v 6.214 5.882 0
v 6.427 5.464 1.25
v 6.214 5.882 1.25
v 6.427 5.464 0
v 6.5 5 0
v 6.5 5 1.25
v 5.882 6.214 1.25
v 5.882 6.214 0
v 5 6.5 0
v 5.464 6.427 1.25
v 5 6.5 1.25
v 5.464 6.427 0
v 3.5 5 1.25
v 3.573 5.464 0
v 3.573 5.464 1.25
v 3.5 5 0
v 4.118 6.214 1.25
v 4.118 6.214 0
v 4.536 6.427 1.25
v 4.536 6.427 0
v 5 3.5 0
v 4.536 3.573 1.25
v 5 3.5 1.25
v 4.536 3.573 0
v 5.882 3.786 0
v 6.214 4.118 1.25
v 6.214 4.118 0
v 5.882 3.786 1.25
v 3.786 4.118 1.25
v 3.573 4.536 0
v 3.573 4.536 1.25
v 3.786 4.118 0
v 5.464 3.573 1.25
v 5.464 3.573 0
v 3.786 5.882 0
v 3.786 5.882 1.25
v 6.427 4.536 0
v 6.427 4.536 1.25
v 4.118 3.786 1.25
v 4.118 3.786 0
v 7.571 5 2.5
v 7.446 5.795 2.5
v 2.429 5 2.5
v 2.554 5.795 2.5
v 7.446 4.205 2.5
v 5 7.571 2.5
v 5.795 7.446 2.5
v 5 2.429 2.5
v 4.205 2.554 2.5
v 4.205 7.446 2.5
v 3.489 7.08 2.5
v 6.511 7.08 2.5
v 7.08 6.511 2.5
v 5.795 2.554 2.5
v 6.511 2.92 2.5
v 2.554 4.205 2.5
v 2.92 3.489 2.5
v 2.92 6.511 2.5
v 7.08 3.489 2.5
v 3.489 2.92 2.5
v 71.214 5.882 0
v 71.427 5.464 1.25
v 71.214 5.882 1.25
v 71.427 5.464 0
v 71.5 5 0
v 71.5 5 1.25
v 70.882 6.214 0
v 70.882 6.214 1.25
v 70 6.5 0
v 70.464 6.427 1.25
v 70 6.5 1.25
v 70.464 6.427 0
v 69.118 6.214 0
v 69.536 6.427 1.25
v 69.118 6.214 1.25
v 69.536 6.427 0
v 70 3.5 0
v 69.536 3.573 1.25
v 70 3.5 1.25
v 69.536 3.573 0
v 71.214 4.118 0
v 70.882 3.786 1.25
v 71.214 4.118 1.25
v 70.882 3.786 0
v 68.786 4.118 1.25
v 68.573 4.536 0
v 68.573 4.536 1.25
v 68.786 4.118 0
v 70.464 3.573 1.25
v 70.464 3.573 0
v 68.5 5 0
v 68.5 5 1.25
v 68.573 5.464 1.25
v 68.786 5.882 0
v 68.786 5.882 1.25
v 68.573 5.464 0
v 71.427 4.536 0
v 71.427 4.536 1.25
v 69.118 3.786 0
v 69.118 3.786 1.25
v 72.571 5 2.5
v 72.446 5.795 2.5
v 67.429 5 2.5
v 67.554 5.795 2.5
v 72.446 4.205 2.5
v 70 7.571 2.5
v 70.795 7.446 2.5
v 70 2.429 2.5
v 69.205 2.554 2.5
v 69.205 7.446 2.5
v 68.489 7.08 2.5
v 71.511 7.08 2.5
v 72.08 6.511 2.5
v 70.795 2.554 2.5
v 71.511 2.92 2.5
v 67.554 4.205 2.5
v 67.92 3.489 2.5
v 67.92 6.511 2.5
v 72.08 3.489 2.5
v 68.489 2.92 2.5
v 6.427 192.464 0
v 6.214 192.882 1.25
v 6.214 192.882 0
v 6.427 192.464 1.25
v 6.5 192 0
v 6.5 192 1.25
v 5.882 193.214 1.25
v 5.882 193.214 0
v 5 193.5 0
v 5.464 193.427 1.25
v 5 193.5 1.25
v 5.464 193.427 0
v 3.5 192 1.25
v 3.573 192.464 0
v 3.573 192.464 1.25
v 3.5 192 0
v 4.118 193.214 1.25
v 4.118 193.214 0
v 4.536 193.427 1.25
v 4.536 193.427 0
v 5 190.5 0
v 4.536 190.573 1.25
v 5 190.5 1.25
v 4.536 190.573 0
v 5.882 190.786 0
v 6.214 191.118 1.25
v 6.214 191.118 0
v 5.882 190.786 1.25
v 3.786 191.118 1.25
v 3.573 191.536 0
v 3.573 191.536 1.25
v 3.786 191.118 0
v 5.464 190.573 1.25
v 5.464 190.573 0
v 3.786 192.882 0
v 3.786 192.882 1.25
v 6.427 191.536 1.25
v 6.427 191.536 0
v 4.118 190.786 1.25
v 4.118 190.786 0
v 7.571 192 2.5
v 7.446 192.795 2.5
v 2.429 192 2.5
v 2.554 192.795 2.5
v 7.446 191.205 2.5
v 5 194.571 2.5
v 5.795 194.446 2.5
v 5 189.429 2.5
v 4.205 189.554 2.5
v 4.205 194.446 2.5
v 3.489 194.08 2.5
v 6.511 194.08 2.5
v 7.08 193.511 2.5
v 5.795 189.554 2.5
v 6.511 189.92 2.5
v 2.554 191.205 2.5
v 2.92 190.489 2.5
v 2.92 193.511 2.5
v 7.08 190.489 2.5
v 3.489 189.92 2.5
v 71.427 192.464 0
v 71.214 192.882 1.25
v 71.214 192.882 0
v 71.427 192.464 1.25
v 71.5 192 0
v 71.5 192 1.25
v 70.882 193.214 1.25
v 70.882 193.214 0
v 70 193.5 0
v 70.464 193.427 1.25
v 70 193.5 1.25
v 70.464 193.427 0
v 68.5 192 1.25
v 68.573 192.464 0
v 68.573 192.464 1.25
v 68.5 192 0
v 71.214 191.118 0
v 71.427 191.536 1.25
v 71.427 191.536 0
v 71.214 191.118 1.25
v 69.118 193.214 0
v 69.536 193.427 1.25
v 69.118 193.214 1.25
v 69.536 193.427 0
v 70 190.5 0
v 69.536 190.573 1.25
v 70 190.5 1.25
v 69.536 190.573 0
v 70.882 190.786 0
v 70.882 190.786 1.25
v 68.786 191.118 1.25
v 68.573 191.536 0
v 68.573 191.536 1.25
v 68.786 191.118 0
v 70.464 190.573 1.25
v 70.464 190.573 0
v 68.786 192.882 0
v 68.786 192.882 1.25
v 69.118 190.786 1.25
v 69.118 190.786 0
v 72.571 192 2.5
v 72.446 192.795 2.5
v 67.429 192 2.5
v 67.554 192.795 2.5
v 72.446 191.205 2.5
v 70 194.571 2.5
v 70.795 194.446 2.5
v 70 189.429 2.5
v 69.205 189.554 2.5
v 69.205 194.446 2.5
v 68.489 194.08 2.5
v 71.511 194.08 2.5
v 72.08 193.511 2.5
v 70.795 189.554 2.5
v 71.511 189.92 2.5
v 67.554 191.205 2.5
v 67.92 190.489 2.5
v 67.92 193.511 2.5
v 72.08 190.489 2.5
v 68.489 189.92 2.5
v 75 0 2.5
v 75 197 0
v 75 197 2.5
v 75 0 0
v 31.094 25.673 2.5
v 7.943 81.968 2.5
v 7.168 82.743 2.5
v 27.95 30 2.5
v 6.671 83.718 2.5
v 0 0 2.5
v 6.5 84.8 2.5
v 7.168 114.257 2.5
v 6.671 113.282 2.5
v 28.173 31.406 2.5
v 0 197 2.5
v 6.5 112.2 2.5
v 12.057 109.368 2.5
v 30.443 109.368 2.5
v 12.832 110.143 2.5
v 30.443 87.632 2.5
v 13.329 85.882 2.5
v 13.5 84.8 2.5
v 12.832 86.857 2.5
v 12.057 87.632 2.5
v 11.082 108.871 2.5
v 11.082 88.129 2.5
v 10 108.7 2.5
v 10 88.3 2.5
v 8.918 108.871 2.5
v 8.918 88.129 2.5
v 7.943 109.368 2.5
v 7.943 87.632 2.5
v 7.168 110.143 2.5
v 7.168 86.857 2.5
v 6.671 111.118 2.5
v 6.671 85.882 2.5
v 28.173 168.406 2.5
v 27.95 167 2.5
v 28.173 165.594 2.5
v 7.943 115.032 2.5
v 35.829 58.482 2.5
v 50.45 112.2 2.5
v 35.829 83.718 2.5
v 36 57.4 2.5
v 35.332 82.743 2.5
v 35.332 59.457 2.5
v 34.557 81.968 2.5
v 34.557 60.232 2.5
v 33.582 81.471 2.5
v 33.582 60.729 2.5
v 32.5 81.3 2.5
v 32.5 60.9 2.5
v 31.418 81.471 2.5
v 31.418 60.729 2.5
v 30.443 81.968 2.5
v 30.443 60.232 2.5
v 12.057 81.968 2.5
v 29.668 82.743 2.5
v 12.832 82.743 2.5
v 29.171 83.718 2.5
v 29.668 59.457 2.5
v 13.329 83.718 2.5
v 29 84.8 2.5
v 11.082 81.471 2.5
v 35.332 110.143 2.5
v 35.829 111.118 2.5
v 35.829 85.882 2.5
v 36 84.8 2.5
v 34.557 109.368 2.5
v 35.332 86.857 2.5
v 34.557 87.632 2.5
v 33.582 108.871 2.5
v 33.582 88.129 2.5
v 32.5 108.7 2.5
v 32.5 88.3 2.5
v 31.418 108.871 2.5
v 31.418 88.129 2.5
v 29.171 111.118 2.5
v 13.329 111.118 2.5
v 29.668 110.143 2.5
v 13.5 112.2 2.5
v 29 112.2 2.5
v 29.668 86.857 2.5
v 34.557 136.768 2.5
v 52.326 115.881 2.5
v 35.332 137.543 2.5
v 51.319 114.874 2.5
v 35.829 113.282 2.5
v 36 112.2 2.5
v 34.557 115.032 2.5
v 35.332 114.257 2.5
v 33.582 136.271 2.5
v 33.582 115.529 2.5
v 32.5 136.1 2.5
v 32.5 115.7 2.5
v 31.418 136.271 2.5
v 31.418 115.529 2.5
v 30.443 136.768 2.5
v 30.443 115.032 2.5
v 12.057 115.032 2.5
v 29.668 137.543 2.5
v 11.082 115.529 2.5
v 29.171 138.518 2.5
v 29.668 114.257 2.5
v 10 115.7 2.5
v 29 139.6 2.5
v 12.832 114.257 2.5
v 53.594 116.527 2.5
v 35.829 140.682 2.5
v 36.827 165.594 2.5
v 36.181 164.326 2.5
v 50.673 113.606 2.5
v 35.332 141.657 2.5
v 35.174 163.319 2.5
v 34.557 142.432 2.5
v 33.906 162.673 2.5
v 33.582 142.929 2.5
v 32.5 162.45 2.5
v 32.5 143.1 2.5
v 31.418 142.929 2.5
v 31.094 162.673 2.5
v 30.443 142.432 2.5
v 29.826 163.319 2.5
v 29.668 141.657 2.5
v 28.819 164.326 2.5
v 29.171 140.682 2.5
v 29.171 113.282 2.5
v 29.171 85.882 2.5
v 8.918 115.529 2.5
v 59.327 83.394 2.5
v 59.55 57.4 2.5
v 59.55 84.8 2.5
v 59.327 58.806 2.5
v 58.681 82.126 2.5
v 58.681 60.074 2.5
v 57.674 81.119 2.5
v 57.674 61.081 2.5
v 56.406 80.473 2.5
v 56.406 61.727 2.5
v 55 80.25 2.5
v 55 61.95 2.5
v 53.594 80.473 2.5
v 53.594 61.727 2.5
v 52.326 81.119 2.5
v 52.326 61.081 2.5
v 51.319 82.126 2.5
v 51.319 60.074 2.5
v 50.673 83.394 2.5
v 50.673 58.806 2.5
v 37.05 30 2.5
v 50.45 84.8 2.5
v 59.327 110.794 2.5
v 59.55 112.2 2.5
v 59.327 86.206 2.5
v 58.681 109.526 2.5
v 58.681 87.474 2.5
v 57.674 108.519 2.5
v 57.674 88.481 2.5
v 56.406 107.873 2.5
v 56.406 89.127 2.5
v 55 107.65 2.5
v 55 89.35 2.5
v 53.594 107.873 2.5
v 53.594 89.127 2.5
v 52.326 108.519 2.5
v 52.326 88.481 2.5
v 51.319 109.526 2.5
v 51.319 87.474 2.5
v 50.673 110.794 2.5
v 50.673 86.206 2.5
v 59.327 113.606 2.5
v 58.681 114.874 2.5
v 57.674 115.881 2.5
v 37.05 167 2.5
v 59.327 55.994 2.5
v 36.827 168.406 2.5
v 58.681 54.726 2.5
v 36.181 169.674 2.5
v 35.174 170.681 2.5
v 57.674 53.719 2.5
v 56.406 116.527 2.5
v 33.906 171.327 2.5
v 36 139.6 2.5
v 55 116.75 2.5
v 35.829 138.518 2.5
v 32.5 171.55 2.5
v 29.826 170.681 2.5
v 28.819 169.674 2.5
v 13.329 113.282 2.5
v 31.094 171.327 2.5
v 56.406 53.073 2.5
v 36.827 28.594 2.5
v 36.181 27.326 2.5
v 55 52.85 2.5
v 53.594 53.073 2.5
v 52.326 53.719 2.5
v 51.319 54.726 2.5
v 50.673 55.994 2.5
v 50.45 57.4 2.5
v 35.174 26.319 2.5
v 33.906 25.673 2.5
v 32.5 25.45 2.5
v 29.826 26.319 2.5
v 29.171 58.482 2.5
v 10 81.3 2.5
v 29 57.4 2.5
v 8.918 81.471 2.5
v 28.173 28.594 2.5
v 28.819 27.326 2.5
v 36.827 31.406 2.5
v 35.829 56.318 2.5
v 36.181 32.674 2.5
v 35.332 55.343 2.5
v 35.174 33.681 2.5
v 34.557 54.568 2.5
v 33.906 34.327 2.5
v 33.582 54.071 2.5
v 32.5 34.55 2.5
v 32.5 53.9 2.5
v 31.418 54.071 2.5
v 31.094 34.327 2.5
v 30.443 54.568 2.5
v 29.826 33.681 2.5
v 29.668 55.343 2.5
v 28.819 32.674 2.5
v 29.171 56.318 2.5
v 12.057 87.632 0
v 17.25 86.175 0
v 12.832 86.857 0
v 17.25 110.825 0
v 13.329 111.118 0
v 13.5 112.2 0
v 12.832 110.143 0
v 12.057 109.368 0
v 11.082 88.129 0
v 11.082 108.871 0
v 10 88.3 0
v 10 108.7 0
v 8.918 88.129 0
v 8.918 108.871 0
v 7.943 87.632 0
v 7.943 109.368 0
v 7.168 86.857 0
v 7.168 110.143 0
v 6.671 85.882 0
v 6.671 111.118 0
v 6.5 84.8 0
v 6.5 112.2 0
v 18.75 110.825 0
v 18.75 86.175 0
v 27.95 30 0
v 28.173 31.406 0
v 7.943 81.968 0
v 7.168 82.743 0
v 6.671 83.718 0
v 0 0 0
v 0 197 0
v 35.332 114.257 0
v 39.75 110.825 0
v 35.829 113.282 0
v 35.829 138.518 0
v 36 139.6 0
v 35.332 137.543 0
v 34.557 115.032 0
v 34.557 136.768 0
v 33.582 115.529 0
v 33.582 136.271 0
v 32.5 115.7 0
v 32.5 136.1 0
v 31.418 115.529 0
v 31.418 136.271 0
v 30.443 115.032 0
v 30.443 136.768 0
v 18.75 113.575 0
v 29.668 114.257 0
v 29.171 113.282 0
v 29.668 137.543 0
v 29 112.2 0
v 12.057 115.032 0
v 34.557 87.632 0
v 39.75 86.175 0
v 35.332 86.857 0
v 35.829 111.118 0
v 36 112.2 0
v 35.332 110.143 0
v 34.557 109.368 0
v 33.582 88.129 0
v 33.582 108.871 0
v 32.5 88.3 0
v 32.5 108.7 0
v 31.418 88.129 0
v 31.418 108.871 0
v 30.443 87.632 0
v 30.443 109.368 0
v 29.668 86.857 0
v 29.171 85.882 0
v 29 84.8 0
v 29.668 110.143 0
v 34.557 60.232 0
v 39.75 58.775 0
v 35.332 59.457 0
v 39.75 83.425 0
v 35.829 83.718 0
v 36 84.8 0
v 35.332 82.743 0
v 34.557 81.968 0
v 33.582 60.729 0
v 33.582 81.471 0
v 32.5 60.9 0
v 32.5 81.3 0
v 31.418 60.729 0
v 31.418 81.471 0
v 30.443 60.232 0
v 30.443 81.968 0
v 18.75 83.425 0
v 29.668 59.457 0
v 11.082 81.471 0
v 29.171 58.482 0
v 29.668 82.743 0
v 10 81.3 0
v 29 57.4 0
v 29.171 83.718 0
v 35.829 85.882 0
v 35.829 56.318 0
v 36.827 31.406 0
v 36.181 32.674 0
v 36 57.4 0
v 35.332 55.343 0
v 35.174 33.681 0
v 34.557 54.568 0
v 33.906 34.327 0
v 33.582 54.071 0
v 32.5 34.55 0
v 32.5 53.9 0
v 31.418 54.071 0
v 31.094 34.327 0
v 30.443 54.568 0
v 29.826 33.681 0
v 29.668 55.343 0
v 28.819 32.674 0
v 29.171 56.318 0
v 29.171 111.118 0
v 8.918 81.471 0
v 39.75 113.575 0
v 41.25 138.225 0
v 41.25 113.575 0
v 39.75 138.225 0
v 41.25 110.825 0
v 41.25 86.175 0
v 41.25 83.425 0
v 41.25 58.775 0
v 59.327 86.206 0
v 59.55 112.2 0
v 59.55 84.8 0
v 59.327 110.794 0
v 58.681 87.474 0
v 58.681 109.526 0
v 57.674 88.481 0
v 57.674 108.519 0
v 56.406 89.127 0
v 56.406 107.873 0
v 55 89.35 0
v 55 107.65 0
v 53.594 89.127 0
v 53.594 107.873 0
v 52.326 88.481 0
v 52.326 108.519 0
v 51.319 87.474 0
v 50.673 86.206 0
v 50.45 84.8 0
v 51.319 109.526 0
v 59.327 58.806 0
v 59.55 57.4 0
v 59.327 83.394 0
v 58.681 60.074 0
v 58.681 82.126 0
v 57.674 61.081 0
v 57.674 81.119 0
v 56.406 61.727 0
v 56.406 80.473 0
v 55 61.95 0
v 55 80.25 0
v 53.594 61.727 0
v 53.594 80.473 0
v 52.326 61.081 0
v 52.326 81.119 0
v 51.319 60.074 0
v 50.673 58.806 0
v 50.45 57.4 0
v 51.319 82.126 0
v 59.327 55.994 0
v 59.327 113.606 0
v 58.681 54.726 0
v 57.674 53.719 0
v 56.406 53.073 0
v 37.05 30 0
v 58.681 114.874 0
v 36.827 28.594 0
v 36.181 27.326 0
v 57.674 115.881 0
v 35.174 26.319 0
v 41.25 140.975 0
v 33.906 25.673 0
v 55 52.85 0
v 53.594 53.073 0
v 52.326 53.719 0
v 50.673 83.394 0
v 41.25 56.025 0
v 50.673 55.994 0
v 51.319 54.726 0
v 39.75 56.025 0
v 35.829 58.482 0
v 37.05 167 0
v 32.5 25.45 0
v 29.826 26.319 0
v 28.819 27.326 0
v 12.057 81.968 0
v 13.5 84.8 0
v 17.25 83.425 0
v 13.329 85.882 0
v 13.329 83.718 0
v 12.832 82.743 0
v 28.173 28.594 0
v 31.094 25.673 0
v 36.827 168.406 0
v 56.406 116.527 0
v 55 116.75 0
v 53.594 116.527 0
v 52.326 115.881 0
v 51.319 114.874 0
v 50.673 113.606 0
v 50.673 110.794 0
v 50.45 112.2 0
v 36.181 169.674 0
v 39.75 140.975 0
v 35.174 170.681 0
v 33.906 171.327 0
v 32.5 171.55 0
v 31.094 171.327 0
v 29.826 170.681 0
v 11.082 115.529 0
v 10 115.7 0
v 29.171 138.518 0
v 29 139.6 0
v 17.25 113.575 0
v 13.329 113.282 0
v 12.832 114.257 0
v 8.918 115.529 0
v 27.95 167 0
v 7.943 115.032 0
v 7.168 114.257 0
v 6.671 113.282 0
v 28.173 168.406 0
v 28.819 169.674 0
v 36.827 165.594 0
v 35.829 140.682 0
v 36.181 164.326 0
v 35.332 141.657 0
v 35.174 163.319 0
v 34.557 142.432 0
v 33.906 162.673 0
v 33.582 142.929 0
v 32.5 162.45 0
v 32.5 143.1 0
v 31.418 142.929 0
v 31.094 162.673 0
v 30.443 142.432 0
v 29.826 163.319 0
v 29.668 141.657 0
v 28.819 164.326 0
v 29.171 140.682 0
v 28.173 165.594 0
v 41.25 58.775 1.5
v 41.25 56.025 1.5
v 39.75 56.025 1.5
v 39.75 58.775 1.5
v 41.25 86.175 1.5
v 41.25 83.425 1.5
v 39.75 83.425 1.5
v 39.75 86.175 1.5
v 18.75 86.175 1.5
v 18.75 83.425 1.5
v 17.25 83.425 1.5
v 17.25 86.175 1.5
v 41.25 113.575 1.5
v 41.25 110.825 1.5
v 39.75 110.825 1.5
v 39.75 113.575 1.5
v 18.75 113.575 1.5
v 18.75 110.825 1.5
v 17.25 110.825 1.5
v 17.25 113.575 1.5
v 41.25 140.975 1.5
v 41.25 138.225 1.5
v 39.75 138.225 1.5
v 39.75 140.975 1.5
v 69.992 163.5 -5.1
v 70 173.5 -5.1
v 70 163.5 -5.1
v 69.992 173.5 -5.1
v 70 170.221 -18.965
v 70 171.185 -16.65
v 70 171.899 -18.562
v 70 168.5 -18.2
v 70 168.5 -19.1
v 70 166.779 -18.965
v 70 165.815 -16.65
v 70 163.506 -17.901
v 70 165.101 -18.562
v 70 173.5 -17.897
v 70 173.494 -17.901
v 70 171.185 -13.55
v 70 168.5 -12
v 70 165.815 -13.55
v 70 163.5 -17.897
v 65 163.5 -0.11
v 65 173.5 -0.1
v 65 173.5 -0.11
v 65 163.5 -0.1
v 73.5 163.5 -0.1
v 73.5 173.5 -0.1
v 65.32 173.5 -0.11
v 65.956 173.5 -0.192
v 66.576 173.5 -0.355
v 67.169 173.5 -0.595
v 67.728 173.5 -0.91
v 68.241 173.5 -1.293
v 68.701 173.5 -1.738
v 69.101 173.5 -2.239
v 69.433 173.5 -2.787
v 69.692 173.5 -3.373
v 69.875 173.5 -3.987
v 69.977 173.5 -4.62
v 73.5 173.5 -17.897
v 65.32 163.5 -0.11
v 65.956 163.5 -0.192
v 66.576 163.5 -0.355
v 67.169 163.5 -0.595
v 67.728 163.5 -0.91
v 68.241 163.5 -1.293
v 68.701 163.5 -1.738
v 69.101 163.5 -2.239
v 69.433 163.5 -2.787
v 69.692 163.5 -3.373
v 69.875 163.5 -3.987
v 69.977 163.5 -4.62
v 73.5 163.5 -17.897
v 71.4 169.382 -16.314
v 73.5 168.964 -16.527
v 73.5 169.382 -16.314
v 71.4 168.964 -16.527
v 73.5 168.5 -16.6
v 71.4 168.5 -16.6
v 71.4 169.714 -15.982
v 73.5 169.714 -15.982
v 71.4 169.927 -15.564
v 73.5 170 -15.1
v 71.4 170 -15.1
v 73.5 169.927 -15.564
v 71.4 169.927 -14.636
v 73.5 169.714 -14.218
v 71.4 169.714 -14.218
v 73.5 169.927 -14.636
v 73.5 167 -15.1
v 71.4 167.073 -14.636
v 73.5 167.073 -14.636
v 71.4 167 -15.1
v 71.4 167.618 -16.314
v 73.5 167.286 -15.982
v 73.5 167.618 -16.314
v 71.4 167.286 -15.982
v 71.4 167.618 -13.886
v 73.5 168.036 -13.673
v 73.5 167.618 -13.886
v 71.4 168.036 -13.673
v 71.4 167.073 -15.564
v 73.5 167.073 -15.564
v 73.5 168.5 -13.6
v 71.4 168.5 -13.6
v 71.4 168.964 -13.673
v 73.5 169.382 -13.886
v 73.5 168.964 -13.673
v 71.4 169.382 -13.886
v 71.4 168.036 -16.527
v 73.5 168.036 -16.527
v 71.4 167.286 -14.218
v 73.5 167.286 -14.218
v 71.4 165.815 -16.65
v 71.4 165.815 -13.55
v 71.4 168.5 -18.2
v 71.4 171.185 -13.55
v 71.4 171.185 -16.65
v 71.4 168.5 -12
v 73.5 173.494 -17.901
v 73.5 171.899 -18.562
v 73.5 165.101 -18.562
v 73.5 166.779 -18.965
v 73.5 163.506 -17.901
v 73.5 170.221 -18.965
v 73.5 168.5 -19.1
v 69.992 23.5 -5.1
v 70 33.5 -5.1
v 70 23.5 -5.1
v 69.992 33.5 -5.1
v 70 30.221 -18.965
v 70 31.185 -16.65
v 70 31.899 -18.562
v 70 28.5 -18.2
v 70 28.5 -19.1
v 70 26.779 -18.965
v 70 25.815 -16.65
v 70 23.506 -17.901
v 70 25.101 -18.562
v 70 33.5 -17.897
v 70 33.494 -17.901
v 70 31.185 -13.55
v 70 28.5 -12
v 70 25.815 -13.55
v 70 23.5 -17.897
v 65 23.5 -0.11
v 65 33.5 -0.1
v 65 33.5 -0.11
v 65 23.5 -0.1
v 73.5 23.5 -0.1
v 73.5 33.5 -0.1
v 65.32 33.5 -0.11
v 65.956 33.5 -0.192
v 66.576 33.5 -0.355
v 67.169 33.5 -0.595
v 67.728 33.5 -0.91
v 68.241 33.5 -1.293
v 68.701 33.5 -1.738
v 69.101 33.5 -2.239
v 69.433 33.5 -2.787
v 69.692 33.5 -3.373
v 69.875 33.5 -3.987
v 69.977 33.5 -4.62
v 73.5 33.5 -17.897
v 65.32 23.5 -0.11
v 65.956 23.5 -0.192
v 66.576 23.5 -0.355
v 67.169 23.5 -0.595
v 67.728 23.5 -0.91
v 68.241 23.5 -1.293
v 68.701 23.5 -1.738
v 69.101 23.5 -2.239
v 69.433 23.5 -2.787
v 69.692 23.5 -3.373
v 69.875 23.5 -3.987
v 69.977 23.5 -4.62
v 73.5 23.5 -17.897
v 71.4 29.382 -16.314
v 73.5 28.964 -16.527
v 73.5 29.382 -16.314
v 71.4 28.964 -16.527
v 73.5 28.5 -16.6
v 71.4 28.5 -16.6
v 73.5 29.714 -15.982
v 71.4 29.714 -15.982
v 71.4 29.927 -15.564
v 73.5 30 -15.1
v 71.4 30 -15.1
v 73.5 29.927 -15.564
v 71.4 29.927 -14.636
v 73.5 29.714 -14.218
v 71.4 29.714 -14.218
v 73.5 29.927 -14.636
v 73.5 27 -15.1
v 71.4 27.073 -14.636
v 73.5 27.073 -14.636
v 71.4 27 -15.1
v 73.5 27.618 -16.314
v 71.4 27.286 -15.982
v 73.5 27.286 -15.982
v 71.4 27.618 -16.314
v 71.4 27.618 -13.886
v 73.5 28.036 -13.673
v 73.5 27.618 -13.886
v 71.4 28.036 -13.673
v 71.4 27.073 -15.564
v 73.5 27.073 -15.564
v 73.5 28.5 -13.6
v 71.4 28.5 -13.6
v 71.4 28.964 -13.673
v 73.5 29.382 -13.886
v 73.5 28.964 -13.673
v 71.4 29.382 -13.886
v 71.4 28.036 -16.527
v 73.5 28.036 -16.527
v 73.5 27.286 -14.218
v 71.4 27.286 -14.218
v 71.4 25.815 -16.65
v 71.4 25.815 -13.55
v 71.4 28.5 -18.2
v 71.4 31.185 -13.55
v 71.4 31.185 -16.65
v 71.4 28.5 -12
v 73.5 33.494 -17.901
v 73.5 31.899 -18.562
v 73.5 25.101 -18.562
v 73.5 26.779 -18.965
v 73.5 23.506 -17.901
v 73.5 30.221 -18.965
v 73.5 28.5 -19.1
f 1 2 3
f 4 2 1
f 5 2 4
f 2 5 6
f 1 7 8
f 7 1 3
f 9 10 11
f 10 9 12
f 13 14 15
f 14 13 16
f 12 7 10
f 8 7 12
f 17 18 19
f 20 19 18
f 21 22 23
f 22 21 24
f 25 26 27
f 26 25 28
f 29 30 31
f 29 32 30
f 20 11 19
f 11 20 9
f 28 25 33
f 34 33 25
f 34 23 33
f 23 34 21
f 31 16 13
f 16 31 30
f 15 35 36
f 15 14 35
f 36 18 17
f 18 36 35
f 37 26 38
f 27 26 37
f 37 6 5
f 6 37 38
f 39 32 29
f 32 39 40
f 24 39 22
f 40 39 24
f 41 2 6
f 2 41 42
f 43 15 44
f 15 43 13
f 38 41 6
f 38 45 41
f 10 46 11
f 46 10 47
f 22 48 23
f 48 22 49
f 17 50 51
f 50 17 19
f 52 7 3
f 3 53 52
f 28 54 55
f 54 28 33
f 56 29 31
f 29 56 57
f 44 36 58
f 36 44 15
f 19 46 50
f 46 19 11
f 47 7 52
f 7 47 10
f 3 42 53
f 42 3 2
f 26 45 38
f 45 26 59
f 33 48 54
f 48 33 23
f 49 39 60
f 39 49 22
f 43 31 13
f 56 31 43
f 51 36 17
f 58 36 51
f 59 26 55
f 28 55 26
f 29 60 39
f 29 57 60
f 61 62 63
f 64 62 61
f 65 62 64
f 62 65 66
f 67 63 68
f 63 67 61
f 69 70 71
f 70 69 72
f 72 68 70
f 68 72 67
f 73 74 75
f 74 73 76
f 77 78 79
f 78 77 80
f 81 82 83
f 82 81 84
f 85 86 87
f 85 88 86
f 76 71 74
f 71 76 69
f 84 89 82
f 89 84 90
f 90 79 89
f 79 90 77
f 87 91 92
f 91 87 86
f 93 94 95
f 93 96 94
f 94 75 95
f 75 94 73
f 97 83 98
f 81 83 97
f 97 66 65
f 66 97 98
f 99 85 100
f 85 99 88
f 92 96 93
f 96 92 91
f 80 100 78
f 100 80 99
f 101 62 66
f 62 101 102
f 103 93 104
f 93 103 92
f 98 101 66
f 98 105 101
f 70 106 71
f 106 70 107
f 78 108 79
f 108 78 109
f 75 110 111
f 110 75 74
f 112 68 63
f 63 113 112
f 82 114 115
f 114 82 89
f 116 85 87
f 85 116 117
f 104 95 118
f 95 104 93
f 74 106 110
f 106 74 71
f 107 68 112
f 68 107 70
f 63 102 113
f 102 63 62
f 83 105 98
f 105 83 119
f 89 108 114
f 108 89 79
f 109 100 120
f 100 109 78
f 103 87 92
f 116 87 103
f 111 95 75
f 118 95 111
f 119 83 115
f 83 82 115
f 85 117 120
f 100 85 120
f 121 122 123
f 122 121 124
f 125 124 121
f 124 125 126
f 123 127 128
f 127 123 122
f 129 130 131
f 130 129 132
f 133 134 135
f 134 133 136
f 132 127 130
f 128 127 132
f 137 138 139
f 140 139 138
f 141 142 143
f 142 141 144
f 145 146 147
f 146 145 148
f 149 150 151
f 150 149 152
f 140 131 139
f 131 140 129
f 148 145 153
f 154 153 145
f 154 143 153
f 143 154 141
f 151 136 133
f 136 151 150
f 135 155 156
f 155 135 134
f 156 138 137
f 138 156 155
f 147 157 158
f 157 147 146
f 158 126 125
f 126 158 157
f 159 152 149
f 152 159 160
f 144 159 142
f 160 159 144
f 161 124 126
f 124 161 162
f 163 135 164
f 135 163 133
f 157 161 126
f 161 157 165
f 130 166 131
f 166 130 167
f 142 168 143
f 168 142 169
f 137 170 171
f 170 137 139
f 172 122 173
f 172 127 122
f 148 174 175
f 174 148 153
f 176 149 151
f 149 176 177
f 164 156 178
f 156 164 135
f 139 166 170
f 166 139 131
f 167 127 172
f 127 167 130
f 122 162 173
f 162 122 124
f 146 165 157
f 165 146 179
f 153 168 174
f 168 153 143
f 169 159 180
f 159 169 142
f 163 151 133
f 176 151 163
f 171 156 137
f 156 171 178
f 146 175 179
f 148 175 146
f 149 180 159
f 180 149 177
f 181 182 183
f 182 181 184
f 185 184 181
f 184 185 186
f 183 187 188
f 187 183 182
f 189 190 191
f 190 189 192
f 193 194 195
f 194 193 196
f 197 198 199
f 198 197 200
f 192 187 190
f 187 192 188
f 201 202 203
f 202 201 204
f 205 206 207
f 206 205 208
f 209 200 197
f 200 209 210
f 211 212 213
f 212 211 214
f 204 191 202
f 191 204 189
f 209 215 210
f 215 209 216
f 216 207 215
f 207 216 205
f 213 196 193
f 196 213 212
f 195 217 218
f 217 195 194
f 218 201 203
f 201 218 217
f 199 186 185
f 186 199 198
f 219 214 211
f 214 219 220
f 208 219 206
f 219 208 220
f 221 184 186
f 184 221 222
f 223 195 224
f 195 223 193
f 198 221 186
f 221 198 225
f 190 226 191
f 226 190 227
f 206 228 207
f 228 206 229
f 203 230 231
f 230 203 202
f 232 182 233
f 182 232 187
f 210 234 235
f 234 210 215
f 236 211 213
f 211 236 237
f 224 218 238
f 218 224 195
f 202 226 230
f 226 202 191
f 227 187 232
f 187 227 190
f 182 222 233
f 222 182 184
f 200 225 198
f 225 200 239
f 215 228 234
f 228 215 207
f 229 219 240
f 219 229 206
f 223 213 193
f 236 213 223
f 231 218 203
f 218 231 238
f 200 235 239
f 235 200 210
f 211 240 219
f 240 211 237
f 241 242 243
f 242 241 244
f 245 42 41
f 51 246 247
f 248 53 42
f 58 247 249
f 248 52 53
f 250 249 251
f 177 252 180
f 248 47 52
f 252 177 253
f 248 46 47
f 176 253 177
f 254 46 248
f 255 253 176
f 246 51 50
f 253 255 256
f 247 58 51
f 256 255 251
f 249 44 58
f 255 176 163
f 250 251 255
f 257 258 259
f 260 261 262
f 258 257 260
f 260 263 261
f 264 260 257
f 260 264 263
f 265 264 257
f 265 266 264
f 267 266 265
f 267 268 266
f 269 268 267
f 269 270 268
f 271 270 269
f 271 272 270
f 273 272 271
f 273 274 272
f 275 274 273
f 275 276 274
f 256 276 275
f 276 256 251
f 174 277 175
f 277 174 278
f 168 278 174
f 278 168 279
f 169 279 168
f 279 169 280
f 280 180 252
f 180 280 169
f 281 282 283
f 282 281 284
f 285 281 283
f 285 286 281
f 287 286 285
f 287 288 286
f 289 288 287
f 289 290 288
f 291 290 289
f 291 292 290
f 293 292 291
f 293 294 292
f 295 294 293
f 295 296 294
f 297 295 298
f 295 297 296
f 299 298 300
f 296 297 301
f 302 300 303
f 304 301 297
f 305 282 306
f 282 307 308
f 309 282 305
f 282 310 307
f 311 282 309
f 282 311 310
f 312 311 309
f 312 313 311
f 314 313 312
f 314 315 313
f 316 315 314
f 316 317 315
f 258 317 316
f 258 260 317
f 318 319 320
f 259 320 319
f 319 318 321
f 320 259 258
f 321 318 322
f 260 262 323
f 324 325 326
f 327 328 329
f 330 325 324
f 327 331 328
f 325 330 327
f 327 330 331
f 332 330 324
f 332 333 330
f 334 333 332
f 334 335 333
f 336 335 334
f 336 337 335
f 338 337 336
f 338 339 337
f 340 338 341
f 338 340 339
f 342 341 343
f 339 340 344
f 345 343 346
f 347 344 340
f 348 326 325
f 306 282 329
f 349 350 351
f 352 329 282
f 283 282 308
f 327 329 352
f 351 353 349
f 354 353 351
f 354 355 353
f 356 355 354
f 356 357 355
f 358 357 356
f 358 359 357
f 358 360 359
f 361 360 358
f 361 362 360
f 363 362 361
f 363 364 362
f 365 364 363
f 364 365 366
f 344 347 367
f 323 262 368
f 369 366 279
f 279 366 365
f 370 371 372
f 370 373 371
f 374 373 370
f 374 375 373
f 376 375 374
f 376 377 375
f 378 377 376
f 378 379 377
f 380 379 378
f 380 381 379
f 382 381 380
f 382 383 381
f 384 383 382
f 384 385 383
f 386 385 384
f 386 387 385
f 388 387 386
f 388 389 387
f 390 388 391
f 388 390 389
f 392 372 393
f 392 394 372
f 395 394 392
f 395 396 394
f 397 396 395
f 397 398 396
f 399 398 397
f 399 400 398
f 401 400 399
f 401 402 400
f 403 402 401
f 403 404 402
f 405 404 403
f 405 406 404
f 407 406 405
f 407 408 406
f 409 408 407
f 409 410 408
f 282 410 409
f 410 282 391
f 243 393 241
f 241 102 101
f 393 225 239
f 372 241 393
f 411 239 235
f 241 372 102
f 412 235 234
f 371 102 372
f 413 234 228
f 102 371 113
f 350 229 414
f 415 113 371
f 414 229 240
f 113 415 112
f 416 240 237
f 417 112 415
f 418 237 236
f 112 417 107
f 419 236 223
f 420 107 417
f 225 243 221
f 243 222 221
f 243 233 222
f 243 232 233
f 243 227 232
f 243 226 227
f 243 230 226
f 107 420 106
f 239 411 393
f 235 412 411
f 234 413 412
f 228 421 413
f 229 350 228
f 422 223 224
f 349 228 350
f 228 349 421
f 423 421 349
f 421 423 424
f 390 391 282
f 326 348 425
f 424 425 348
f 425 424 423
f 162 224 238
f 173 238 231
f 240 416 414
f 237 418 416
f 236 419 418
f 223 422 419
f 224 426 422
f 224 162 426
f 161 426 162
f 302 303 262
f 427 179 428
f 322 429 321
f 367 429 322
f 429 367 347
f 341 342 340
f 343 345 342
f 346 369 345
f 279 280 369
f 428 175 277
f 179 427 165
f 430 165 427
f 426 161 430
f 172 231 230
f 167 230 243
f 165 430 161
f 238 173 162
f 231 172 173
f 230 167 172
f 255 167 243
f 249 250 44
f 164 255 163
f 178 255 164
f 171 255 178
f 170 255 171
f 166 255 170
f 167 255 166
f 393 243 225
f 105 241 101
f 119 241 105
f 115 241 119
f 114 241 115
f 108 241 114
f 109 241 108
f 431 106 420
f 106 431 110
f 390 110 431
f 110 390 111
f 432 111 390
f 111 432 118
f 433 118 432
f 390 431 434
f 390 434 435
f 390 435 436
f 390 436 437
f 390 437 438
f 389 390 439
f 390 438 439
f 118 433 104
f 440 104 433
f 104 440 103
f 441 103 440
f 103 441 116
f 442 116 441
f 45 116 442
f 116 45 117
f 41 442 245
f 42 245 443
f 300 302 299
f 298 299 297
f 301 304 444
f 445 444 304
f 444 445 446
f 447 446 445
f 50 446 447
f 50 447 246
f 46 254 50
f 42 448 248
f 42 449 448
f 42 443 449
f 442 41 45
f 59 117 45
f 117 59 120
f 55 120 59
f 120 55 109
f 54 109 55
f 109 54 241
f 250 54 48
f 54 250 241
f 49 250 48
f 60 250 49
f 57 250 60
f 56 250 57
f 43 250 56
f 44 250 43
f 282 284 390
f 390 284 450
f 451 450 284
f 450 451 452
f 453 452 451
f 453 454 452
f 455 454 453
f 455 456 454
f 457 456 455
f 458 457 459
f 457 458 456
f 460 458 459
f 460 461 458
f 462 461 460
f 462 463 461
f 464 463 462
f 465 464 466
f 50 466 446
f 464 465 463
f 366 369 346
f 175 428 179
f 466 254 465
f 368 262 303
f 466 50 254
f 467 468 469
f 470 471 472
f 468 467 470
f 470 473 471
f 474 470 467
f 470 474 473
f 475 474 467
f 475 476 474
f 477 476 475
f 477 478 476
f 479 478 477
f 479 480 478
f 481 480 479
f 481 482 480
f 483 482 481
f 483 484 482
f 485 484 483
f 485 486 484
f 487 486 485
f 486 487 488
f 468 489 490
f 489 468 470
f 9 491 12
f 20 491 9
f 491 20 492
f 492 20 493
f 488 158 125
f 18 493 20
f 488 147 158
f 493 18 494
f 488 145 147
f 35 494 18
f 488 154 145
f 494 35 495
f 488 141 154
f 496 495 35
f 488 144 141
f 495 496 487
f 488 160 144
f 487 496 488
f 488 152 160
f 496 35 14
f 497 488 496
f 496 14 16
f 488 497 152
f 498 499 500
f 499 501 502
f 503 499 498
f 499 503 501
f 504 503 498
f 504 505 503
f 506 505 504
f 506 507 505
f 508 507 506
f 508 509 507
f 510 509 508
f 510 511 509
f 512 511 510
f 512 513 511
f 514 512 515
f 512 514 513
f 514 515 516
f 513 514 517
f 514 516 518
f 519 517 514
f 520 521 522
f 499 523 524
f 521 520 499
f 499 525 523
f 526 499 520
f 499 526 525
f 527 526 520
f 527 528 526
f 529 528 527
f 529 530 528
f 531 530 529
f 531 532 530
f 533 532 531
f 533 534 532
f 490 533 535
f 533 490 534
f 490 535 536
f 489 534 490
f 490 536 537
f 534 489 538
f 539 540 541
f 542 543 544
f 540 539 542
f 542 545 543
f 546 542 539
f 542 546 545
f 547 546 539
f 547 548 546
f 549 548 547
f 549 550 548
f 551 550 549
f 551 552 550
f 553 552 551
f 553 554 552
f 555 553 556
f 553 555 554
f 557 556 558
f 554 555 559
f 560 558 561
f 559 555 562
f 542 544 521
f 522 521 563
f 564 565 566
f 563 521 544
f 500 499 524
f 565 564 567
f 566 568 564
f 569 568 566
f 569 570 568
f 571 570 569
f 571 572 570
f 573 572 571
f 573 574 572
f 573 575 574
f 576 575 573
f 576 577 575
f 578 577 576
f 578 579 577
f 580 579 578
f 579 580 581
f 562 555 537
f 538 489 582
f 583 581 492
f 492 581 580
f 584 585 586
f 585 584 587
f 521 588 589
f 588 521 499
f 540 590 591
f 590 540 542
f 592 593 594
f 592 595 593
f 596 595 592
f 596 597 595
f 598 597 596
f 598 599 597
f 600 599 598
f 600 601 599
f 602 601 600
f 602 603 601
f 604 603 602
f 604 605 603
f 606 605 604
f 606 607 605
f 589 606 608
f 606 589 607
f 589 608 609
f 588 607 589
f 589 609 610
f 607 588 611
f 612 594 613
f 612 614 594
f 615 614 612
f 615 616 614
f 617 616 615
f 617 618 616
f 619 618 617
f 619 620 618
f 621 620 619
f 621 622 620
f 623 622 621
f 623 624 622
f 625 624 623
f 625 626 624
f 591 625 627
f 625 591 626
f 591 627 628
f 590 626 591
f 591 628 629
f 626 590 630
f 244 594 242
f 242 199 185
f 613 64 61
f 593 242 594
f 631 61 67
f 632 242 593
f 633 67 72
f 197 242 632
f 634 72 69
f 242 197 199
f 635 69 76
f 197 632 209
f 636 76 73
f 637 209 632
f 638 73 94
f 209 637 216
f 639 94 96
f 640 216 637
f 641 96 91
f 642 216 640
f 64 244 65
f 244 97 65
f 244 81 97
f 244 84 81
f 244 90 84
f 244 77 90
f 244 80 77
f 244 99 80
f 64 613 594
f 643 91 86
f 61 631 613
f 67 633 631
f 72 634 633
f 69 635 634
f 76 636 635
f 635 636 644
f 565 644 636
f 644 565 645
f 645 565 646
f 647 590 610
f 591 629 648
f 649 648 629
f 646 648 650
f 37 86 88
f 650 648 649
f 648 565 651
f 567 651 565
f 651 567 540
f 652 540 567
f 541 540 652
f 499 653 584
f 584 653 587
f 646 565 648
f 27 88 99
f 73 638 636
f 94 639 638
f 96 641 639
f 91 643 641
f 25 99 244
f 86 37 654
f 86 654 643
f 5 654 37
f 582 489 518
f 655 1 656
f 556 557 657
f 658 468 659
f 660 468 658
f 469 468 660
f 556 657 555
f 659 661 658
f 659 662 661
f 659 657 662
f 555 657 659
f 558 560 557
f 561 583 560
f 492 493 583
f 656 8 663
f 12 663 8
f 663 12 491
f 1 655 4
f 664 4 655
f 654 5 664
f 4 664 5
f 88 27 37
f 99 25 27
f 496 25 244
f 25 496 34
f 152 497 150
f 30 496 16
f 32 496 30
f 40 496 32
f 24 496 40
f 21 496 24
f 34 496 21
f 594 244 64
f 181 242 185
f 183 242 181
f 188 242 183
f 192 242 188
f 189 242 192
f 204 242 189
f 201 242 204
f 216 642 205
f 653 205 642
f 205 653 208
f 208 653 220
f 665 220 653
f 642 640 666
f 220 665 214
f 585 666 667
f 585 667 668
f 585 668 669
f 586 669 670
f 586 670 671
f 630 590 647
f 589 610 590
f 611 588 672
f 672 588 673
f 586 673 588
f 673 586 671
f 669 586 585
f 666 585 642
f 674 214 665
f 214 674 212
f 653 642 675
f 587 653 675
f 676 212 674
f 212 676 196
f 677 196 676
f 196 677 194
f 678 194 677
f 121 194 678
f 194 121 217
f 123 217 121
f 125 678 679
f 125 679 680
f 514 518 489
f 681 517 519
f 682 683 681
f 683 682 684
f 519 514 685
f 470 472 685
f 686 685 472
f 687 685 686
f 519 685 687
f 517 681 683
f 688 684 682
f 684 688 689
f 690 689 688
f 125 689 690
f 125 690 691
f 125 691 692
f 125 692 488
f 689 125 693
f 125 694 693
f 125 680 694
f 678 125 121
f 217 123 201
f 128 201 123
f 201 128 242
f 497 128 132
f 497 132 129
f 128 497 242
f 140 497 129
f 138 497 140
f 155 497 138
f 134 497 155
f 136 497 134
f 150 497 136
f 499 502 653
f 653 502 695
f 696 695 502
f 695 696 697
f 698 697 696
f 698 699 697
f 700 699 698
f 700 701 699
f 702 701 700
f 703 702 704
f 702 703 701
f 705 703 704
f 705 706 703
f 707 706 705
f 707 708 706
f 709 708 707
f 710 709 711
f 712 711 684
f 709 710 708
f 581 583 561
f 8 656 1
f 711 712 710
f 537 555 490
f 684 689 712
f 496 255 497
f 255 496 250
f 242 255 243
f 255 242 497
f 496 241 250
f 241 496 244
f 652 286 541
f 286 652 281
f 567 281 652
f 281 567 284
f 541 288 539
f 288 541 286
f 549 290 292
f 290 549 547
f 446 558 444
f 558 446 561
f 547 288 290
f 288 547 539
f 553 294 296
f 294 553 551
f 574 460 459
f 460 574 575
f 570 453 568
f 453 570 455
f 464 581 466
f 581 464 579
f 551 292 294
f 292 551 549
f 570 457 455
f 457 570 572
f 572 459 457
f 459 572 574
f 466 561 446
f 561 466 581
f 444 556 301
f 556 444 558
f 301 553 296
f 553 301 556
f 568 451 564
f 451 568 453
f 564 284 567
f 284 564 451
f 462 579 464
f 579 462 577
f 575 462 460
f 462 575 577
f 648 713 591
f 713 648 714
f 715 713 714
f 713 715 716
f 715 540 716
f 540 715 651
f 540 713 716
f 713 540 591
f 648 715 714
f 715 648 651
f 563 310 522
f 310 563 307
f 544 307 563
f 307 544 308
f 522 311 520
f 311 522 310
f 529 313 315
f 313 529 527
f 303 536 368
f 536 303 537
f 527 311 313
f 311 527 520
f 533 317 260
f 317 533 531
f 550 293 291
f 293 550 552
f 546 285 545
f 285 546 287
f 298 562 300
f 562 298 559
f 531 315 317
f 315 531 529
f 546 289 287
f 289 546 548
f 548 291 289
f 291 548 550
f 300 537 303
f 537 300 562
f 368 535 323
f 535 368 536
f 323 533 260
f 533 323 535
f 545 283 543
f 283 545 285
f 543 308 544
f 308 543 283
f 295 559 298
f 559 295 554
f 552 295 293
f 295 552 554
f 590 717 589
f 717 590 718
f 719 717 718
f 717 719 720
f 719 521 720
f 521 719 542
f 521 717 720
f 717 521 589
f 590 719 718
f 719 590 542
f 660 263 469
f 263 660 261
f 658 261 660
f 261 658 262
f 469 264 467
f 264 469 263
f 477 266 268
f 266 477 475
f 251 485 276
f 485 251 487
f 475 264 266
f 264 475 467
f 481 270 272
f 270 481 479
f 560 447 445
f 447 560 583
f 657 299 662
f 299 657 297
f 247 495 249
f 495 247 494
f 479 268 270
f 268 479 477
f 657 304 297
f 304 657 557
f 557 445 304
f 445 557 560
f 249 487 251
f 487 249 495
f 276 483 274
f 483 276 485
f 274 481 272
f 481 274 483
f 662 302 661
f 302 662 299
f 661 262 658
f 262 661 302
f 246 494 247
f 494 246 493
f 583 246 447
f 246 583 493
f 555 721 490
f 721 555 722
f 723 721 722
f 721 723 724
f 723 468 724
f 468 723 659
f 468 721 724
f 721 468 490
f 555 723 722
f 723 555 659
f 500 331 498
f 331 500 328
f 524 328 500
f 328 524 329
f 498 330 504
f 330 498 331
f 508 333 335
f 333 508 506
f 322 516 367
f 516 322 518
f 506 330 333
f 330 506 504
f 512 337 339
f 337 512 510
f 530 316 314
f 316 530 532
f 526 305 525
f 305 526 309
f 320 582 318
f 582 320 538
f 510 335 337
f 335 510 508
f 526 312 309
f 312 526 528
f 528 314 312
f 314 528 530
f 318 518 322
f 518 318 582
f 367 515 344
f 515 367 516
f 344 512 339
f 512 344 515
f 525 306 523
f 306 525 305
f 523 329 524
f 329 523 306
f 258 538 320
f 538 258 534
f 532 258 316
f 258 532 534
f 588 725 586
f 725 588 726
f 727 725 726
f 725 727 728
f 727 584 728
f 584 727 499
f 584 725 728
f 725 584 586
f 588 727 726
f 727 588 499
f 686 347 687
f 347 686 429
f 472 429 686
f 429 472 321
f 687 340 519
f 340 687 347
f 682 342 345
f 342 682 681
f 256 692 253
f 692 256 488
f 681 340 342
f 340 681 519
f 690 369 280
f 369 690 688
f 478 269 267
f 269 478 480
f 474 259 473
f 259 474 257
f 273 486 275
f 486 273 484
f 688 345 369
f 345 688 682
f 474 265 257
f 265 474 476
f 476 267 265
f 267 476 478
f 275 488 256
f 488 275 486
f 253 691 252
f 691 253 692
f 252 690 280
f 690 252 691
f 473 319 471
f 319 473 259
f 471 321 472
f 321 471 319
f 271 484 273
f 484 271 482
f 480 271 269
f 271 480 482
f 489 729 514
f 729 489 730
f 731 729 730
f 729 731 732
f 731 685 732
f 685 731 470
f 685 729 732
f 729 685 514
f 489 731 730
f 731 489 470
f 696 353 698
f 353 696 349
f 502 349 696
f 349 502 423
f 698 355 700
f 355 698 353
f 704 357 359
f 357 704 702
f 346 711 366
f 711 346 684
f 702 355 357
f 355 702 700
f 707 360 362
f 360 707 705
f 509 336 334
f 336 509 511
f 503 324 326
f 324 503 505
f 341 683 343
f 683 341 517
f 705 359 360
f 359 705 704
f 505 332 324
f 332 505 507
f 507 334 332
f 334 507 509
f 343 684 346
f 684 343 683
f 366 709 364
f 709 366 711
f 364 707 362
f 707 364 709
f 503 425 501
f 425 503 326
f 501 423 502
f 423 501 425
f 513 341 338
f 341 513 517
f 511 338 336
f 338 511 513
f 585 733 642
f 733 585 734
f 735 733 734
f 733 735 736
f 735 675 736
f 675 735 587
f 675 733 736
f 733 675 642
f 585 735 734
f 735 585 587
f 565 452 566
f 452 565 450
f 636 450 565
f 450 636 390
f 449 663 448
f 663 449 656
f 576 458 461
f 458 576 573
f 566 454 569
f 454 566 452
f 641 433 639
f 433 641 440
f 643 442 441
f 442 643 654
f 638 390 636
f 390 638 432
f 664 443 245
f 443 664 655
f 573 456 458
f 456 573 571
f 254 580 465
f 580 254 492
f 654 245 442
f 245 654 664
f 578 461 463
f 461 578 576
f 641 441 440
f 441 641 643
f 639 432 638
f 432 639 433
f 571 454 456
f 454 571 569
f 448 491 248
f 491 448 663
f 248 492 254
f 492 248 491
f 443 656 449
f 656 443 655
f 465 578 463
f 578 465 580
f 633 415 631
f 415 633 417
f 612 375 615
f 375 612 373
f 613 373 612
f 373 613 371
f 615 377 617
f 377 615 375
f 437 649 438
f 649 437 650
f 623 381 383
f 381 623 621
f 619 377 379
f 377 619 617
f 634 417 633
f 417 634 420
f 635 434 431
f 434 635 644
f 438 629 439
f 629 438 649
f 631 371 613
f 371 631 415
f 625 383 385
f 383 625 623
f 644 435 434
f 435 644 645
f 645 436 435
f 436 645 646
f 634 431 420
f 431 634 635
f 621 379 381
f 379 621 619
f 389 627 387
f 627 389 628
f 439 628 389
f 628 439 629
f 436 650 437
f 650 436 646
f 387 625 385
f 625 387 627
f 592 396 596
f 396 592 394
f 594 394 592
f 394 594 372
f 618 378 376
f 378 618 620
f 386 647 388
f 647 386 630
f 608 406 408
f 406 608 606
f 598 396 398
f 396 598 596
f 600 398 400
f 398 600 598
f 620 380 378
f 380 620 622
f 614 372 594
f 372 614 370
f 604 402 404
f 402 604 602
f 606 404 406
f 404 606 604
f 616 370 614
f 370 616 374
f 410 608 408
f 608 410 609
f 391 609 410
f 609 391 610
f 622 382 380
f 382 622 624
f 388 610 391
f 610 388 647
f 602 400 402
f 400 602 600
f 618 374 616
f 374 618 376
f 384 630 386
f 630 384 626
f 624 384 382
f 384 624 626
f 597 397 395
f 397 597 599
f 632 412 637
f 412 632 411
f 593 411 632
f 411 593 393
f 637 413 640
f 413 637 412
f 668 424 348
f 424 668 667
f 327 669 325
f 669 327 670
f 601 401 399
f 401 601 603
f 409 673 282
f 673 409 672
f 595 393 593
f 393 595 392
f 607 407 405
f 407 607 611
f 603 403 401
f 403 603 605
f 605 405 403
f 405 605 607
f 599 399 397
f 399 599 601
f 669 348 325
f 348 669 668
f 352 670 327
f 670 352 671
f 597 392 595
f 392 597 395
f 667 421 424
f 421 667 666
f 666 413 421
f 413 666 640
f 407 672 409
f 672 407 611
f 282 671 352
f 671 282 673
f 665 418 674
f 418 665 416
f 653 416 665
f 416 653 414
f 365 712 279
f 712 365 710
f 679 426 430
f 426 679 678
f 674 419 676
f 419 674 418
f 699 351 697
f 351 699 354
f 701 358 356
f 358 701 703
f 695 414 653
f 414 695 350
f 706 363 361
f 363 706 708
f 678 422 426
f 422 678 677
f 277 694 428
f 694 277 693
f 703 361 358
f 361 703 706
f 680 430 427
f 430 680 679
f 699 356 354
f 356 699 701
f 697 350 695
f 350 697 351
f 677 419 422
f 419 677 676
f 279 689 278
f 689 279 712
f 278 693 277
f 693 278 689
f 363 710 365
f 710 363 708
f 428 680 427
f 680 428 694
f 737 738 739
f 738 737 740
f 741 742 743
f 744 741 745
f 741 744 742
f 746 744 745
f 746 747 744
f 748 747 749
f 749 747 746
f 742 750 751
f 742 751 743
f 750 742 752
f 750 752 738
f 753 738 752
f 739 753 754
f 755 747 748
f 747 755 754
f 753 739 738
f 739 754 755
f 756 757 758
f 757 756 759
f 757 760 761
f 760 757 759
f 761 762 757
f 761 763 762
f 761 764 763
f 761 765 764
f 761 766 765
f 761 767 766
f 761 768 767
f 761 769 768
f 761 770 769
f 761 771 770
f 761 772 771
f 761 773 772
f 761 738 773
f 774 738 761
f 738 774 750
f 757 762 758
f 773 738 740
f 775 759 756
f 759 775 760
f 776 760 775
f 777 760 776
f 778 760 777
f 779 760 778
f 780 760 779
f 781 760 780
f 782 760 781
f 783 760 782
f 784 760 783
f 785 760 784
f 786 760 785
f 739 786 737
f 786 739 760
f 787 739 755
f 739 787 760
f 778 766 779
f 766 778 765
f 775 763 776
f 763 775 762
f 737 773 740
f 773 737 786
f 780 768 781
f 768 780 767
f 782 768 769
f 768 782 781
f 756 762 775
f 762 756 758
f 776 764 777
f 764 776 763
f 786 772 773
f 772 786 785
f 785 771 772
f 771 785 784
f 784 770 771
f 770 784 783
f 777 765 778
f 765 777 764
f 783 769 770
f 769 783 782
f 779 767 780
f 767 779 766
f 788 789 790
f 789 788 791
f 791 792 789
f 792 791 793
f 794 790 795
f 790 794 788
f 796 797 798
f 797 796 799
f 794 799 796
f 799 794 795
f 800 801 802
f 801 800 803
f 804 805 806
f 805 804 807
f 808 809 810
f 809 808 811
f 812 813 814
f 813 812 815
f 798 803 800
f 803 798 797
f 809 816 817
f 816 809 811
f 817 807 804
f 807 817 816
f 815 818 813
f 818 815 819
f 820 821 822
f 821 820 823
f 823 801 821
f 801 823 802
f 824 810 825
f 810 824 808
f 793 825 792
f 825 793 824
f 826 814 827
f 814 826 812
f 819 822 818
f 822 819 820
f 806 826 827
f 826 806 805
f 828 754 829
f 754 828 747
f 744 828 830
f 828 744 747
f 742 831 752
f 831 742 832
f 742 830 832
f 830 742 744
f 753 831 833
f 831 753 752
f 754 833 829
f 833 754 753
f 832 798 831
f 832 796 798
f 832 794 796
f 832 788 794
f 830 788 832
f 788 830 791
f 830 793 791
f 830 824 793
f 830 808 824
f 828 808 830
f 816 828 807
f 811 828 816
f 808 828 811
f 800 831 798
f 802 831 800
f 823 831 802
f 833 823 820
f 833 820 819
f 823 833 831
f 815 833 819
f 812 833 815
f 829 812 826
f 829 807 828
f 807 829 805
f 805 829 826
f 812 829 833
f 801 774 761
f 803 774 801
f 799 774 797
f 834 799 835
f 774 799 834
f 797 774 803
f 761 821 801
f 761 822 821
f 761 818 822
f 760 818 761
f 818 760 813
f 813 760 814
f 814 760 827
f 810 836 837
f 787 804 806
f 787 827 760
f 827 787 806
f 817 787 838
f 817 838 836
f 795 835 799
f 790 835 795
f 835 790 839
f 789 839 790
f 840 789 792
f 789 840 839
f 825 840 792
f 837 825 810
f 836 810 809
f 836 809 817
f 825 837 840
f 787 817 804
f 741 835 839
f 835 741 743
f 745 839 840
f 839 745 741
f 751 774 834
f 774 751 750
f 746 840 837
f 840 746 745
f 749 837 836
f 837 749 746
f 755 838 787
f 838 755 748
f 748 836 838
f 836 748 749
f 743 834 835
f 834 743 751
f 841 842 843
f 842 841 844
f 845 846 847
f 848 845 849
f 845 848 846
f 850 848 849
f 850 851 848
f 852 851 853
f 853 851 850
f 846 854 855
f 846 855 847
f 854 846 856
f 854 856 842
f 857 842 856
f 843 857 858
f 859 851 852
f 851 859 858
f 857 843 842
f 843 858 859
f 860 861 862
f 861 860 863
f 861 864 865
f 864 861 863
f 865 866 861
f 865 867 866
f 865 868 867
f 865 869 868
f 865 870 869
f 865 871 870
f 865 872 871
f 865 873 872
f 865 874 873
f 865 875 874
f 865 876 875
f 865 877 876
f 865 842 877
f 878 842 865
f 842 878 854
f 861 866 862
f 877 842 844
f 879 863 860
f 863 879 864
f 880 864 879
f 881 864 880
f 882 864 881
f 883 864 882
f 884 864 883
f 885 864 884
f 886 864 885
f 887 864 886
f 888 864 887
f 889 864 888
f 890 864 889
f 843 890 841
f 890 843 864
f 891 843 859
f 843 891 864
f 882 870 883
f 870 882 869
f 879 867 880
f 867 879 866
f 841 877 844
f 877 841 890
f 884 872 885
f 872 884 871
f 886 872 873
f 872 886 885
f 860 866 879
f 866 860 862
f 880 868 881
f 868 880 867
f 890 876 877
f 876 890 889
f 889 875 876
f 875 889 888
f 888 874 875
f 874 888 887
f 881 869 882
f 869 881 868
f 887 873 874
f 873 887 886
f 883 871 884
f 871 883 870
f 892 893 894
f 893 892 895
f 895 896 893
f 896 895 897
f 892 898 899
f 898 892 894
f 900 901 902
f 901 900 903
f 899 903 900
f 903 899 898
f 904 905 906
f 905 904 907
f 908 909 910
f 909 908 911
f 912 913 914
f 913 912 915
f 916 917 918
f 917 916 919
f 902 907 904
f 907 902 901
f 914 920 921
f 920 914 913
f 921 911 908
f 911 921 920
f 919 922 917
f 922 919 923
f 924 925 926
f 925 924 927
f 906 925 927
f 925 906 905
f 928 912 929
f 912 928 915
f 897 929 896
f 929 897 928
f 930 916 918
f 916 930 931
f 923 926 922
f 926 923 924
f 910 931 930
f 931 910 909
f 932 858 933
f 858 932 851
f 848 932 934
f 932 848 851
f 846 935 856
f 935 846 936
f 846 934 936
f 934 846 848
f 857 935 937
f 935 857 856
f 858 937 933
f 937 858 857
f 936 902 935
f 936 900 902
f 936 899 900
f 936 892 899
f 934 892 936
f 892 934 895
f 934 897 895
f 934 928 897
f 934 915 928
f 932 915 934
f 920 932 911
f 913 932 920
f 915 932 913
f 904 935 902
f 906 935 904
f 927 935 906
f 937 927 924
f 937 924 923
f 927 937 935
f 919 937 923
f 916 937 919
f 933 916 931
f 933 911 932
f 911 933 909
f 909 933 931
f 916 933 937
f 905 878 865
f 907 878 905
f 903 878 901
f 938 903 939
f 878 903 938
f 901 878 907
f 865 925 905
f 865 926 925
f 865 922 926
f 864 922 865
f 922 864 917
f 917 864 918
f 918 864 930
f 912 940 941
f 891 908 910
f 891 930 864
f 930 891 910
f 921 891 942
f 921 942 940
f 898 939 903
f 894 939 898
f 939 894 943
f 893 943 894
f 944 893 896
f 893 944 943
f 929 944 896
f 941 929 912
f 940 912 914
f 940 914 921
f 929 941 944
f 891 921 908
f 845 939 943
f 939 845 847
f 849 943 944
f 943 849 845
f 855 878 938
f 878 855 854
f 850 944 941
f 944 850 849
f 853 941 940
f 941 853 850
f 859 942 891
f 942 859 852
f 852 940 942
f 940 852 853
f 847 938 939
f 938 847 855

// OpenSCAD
// file: kosmo.scad
panelHeight = 197;
thickness = 2.5;
mountHoleDiameter = 3.0;
jackHoleDiameter = 9.1;
ledHoleDiameter = 5;
pushButtonHoleDiameter = 7;
potHoleDiameter = 7;
switchHoleDiameter = 6;
rotarySwitchHoleDiameter = 9.1;
midiSocketHoleDiameter = 15;
colPaddingLeft = 20;
colPaddingRight = 10;
rowPadding = 30;

offsetTopBottom = 20; // Mounting area

n_rows = 6;
n_cols = width / 25;

rowsStart = rowPadding;
rowsEnd = panelHeight - rowPadding;

colsStart = colPaddingRight;
colsEnd = width - colPaddingLeft;


function row (i) = rowsStart + i * (rowsEnd - rowsStart) / (n_rows - 1);
function col (i) = colsStart + i * (colsEnd - colsStart) / (n_cols - 1);

module pcbHolders(){
  pcbHolder(width-5, panelHeight/2 + 140/2 - 5);
  pcbHolder(width-5, panelHeight/2 - 140/2 - 5);
}


module pcbHolder(x, y){
  pcbHole = 3;
  w = 10;
  h = 20;
  clearance = 15; // distance between panel and PCB hole
    
  translate([x, y, -0.1]) { // prevent gap
    rotate([0, 90, 0]) {
      union() {
        difference() {
          translate([0, 0, -5]) {               
            cube([5,w,5]);
          }
          translate([5, w+1, -5]) {
            rotate([90, 0, 0]) {
              cylinder(r=5, h=w+2,$fn=49);
            }
          }
        }
        /**/
        intersection() {
          difference() {
            cube([h, w, thickness+1]);
            translate([clearance, w/2, -0.9]){
              cylinder(r=pcbHole/2,  h=thickness+2, $fn=20);
              cylinder(r=3.1, h=2.3, $fn=6);
            }
          }
          translate([h/2-2, w/2, -1]) {
            cylinder(r=w+1, h=thickness+2, $fn=40);
          }
        }
        /**/
      }
    }
  }
}



module kosmoMountHoles(width, height) {
  punchHole(5, 5, mountHoleDiameter,true);
  punchHole((width-5), 5, mountHoleDiameter,true);
  punchHole(5, (height-5), mountHoleDiameter,true);
  punchHole((width-5), (height-5), mountHoleDiameter,true);
}


module punchHole(x, y, holeSize,chamfer=false){
  translate([x, y, -1]){
    cylinder(r=holeSize/2, h=thickness+2, $fn=20);
    if(chamfer) {
      translate([0, 0, 0.5]){
        cylinder(r2=holeSize, r1=0, h=holeSize+0.5, $fn=20);
      }
    }
  }
}

module midiSocket(x, y) {
    punchHole(x, y, midiSocketHoleDiameter);
}
module led(x, y) {
    punchHole(x, y, ledHoleDiameter);
}
module switch(x, y) { 
    punchHole(x, y, switchHoleDiameter);
}
module pushButton(x, y) { 
    punchHole(x, y, pushButtonHoleDiameter);
}
module rotarySwitch(x, y) { 
    punchHole(x, y, rotarySwitchHoleDiameter);
}
module sevenSegmentDisplay(x, y) {
    translate([x-6.5, y-9.6, -1]){
        cube([13, 19.2, thickness+2]);
    }
}

module pot(x, y) {
  translate([x, y , 0]) {
    union() {
      punchHole(0, 0, potHoleDiameter);
      translate([7.25, -2.75/2, -0.1]) {
        cube([1.5, 2.75, 1.6]);
      }
    }
  }
  echo(concat("pot at ", x, y));
}

module jack(x, y){
  punchHole(x, y, jackHoleDiameter);
    echo(concat("Jack at", x, y));
}

module panel(width) {
  difference() {
    cube([width, panelHeight, thickness]);
    kosmoMountHoles(width, panelHeight);
  }
}
// main file
width = 75;
include <kosmo.scad>
n_rows = 6;

 difference() {
     panel(width);
     
     jack(col(1), row(0)); // gate in
     
     jack(col(2), row(1)); // Accent CV
     pot(col(1), row(1)); // Accent CV lvl
     
     jack(col(2), row(2)); // Tune CV
     pot(col(1), row(2)); // Tune CV lvl
     pot(col(0), row(2)); // Tune offset
     
     jack(col(2), row(3)); // Decay CV
     pot(col(1), row(3)); // Decay CV lvl
     pot(col(0), row(3)); // Decay offset
     
     pot(col(1), row(4)); // Tone
     
     
     jack(col(1), row(5)); // Output
     
     
     
     
 }
pcbHolders();
